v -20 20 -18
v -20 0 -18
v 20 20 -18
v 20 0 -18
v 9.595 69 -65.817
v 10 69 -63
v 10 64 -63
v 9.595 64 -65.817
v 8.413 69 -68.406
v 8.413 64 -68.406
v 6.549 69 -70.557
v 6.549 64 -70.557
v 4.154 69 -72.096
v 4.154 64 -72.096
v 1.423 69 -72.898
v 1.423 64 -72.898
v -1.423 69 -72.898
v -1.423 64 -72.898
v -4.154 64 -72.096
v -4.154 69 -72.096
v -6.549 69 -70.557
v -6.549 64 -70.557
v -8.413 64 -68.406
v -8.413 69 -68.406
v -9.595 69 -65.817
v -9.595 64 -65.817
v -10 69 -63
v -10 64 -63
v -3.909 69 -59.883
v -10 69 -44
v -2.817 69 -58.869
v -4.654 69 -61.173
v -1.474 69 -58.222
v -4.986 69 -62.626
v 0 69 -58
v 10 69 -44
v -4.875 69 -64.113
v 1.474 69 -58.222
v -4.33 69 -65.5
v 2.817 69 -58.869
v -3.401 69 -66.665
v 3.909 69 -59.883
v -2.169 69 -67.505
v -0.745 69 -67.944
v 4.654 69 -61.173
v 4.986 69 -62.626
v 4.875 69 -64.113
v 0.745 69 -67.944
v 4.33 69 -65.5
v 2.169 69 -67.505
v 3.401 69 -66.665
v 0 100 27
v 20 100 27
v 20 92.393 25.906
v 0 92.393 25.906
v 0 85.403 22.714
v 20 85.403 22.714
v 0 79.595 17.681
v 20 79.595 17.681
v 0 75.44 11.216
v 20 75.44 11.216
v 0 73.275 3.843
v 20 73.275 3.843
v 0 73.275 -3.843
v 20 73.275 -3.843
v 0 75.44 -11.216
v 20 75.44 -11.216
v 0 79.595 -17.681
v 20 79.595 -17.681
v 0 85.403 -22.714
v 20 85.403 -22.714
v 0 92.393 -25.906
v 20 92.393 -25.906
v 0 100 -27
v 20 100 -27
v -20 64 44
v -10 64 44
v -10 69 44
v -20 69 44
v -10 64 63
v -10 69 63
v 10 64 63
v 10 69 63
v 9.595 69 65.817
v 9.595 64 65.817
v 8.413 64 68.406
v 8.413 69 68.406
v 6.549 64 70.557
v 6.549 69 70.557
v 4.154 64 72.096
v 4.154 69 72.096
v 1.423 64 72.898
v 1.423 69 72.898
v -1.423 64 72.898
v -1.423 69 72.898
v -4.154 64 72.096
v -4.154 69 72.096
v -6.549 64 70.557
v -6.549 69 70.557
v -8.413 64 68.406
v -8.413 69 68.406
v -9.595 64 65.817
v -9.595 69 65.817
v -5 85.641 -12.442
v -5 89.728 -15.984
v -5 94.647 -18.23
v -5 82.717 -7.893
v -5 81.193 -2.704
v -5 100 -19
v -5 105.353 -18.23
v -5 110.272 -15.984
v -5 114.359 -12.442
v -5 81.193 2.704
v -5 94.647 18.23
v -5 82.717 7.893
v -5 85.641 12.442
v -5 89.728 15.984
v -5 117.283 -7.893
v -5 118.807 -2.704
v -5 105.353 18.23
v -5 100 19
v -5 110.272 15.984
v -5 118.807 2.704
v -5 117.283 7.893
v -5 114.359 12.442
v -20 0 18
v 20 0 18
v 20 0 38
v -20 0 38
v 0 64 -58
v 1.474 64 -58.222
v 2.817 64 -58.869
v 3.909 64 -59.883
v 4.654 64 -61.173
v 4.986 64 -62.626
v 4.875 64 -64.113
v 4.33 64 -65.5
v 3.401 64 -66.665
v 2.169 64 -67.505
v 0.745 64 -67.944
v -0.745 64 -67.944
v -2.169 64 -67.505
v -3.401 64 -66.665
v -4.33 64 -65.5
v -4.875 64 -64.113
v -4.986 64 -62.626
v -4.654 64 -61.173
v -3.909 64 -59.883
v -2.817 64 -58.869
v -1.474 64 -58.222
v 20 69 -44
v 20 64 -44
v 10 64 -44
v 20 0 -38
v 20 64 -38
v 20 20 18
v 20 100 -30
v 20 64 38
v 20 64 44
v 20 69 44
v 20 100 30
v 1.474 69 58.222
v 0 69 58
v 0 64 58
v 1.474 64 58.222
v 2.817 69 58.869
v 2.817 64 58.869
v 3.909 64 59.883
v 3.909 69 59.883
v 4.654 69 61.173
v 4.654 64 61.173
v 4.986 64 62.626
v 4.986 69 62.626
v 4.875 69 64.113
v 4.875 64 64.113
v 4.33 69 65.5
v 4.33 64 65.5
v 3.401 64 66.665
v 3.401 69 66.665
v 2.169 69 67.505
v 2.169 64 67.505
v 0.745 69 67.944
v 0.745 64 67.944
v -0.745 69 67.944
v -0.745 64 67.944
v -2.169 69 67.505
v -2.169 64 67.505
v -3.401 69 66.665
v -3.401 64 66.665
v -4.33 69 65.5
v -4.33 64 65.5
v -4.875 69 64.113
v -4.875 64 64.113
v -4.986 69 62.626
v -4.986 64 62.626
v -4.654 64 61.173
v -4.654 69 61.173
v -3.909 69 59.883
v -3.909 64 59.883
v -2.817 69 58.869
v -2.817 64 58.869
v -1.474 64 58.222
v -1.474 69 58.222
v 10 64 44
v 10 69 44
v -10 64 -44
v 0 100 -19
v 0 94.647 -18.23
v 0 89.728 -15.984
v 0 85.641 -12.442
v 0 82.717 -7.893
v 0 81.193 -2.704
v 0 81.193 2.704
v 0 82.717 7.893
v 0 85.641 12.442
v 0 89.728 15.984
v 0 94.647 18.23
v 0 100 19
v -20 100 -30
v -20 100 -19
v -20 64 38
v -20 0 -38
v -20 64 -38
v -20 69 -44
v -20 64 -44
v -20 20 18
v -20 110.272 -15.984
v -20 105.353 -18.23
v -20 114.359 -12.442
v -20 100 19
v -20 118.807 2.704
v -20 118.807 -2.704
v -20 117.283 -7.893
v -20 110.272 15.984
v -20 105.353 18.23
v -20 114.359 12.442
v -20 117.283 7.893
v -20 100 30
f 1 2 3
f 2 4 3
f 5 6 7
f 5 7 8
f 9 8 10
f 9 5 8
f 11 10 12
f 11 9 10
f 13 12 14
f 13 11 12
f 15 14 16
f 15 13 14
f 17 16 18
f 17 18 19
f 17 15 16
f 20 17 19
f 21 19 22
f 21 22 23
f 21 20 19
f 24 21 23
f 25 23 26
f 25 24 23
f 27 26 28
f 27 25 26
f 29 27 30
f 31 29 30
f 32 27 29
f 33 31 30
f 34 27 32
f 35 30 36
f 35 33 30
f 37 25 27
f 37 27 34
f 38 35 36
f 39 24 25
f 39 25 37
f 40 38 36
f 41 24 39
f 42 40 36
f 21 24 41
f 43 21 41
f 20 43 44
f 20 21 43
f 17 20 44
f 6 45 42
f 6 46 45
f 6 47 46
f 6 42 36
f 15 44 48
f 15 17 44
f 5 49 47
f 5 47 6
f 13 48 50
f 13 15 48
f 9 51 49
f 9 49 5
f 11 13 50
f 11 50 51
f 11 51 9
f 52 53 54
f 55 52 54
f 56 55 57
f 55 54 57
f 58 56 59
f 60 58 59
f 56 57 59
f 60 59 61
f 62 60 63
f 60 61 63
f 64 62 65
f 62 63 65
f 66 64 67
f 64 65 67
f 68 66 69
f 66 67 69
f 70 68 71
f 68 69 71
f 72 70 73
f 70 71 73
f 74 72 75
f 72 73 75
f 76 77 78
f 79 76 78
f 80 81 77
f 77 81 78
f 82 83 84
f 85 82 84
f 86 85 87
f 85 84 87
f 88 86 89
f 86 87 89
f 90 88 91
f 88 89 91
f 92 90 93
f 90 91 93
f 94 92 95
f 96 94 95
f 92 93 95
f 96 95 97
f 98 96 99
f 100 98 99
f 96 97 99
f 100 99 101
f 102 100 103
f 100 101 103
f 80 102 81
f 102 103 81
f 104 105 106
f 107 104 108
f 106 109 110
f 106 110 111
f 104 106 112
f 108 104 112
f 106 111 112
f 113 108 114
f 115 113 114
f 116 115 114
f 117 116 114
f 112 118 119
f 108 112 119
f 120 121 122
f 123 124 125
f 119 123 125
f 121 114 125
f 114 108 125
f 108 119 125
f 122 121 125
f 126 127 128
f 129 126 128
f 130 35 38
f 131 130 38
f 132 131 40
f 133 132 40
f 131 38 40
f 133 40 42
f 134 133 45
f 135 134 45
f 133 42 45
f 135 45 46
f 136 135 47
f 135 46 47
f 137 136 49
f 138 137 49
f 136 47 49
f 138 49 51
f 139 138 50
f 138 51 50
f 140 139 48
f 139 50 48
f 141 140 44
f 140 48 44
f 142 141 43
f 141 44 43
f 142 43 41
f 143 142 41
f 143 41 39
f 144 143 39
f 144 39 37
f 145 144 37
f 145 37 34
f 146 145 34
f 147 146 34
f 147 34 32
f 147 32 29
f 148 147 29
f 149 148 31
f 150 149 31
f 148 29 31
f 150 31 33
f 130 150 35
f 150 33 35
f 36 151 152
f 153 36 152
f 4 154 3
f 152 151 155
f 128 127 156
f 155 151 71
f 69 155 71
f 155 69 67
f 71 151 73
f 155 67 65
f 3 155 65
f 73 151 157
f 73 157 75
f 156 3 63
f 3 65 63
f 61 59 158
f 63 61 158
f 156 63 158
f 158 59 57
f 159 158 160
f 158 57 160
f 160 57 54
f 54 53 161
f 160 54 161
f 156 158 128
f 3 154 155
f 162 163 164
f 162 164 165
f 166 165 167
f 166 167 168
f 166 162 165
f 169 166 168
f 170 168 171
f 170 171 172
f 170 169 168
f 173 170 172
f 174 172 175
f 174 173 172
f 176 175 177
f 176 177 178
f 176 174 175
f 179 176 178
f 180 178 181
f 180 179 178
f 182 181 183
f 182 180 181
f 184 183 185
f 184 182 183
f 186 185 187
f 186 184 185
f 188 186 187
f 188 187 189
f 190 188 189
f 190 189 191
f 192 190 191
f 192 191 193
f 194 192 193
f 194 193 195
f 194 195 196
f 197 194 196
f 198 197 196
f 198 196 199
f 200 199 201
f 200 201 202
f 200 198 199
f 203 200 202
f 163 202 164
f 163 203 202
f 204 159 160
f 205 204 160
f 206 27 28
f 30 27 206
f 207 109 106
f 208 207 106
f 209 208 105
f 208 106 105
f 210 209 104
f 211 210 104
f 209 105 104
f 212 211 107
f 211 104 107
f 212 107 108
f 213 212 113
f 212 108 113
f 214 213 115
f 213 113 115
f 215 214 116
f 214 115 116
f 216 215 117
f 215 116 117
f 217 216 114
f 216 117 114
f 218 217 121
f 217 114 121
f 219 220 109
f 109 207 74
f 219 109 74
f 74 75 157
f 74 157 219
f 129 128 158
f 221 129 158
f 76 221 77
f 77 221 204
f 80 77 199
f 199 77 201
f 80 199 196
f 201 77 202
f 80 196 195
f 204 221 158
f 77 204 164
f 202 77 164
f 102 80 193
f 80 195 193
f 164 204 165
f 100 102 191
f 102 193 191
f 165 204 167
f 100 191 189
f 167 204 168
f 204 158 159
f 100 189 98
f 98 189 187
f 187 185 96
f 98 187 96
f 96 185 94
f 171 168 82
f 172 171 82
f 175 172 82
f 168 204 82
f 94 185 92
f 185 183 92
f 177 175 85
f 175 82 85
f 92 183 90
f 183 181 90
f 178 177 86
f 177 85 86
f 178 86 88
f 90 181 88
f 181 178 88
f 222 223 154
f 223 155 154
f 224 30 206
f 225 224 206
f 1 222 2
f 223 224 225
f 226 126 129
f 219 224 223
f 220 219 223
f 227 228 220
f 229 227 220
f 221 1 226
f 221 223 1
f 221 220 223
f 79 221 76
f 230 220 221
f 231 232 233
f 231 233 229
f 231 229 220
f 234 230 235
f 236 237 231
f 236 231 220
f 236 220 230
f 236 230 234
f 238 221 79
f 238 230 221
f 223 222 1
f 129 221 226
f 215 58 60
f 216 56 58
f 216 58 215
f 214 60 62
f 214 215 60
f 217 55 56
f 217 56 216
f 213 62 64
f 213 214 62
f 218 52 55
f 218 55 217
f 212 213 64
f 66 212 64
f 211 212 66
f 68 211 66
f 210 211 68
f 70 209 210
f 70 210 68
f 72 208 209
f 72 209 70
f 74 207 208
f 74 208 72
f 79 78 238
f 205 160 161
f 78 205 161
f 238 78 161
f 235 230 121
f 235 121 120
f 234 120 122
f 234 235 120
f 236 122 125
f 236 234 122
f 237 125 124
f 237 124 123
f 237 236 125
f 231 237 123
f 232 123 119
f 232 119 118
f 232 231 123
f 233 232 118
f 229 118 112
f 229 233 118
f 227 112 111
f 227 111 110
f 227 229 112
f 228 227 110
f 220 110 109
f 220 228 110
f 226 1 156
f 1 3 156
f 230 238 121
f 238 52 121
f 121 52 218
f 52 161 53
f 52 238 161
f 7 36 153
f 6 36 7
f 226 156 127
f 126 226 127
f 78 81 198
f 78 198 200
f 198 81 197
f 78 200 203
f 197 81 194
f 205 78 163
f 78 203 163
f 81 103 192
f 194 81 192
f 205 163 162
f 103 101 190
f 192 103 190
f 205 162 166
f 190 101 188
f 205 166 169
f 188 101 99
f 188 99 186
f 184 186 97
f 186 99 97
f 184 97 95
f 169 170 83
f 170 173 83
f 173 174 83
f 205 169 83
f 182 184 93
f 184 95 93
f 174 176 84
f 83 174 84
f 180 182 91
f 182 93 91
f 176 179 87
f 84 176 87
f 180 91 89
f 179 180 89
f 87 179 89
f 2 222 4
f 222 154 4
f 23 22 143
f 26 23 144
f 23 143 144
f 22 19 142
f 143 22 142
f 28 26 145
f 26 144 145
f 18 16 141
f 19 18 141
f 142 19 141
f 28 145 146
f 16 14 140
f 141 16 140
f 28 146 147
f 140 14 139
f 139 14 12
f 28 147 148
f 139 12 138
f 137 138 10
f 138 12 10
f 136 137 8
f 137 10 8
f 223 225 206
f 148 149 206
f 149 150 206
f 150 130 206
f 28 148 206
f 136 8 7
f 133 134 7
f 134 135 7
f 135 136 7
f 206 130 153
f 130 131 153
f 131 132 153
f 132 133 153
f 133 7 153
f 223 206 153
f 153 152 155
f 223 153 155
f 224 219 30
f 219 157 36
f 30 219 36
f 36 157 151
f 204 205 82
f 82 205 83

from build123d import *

# Parameters (mm, degrees)
BOSS_EXTRUDE1_DEPTH = 20
HOLE1_D             = 38
HOLE1_DEPTH         = 100
HOLE1_CBORE_D       = 54
HOLE1_CBORE_DEPTH   = 20
HOLE1_TIP           = 11.416351762
SKETCH4_R           = 19
BOSS_EXTRUDE2_DEPTH = 15
SKETCH5_R           = 5
BOSS_EXTRUDE3_DEPTH = 5


with BuildPart() as part:
    # Sketch1 → Boss-Extrude1 (new, symmetric)
    with BuildSketch(Plane(origin=(0, 0, 0), x_dir=(0, 0, -1), z_dir=(1, 0, 0))):
        Polygon((-38, 0), (-38, 64), (-44, 64), (-44, 69), (-30, 100), (30, 100), (44, 69), (44, 64), (38, 64), (38, 0), (18, 0), (18, 20), (-18, 20), (-18, 0), align=None)
    extrude(amount=BOSS_EXTRUDE1_DEPTH, both=True)

    # Hole1
    with Locations(Plane(origin=(20, 0, 0), x_dir=(0, 0, -1), z_dir=(1, 0, 0))):
        with Locations((0, 100)):
            CounterBoreHole(HOLE1_D / 2, HOLE1_CBORE_D / 2, HOLE1_CBORE_DEPTH, depth=HOLE1_DEPTH)
            with Locations((0, 0, -(HOLE1_DEPTH + HOLE1_TIP / 2))):  # 118° drill point
                Cone(0, HOLE1_D / 2, HOLE1_TIP, mode=Mode.SUBTRACT)

    # Sketch4 → Boss-Extrude2 (add)
    with BuildSketch(Plane.ZY.offset(20)):
        with Locations((0, 100)):
            Circle(SKETCH4_R)
    extrude(amount=-BOSS_EXTRUDE2_DEPTH)

    # Sketch5 → Boss-Extrude3 (add)
    with BuildSketch(Plane(origin=(0, 69, 0), x_dir=(1, 0, 0), z_dir=(0, 1, 0))):
        with BuildLine():
            Line((-10, 63), (-10, 44))
            Line((-10, 44), (10, 44))
            Line((10, 44), (10, 63))
            ThreePointArc((10, 63), (0, 73), (-10, 63))
        make_face()
        with Locations(Location((0, 63, 0), (0, 0, 270))):
            Circle(SKETCH5_R, mode=Mode.SUBTRACT)
    boss_extrude3 = extrude(amount=-BOSS_EXTRUDE3_DEPTH)

    # Mirror1: Boss-Extrude3 across plane
    add(boss_extrude3.mirror(Plane.XY))


solid = part.part
